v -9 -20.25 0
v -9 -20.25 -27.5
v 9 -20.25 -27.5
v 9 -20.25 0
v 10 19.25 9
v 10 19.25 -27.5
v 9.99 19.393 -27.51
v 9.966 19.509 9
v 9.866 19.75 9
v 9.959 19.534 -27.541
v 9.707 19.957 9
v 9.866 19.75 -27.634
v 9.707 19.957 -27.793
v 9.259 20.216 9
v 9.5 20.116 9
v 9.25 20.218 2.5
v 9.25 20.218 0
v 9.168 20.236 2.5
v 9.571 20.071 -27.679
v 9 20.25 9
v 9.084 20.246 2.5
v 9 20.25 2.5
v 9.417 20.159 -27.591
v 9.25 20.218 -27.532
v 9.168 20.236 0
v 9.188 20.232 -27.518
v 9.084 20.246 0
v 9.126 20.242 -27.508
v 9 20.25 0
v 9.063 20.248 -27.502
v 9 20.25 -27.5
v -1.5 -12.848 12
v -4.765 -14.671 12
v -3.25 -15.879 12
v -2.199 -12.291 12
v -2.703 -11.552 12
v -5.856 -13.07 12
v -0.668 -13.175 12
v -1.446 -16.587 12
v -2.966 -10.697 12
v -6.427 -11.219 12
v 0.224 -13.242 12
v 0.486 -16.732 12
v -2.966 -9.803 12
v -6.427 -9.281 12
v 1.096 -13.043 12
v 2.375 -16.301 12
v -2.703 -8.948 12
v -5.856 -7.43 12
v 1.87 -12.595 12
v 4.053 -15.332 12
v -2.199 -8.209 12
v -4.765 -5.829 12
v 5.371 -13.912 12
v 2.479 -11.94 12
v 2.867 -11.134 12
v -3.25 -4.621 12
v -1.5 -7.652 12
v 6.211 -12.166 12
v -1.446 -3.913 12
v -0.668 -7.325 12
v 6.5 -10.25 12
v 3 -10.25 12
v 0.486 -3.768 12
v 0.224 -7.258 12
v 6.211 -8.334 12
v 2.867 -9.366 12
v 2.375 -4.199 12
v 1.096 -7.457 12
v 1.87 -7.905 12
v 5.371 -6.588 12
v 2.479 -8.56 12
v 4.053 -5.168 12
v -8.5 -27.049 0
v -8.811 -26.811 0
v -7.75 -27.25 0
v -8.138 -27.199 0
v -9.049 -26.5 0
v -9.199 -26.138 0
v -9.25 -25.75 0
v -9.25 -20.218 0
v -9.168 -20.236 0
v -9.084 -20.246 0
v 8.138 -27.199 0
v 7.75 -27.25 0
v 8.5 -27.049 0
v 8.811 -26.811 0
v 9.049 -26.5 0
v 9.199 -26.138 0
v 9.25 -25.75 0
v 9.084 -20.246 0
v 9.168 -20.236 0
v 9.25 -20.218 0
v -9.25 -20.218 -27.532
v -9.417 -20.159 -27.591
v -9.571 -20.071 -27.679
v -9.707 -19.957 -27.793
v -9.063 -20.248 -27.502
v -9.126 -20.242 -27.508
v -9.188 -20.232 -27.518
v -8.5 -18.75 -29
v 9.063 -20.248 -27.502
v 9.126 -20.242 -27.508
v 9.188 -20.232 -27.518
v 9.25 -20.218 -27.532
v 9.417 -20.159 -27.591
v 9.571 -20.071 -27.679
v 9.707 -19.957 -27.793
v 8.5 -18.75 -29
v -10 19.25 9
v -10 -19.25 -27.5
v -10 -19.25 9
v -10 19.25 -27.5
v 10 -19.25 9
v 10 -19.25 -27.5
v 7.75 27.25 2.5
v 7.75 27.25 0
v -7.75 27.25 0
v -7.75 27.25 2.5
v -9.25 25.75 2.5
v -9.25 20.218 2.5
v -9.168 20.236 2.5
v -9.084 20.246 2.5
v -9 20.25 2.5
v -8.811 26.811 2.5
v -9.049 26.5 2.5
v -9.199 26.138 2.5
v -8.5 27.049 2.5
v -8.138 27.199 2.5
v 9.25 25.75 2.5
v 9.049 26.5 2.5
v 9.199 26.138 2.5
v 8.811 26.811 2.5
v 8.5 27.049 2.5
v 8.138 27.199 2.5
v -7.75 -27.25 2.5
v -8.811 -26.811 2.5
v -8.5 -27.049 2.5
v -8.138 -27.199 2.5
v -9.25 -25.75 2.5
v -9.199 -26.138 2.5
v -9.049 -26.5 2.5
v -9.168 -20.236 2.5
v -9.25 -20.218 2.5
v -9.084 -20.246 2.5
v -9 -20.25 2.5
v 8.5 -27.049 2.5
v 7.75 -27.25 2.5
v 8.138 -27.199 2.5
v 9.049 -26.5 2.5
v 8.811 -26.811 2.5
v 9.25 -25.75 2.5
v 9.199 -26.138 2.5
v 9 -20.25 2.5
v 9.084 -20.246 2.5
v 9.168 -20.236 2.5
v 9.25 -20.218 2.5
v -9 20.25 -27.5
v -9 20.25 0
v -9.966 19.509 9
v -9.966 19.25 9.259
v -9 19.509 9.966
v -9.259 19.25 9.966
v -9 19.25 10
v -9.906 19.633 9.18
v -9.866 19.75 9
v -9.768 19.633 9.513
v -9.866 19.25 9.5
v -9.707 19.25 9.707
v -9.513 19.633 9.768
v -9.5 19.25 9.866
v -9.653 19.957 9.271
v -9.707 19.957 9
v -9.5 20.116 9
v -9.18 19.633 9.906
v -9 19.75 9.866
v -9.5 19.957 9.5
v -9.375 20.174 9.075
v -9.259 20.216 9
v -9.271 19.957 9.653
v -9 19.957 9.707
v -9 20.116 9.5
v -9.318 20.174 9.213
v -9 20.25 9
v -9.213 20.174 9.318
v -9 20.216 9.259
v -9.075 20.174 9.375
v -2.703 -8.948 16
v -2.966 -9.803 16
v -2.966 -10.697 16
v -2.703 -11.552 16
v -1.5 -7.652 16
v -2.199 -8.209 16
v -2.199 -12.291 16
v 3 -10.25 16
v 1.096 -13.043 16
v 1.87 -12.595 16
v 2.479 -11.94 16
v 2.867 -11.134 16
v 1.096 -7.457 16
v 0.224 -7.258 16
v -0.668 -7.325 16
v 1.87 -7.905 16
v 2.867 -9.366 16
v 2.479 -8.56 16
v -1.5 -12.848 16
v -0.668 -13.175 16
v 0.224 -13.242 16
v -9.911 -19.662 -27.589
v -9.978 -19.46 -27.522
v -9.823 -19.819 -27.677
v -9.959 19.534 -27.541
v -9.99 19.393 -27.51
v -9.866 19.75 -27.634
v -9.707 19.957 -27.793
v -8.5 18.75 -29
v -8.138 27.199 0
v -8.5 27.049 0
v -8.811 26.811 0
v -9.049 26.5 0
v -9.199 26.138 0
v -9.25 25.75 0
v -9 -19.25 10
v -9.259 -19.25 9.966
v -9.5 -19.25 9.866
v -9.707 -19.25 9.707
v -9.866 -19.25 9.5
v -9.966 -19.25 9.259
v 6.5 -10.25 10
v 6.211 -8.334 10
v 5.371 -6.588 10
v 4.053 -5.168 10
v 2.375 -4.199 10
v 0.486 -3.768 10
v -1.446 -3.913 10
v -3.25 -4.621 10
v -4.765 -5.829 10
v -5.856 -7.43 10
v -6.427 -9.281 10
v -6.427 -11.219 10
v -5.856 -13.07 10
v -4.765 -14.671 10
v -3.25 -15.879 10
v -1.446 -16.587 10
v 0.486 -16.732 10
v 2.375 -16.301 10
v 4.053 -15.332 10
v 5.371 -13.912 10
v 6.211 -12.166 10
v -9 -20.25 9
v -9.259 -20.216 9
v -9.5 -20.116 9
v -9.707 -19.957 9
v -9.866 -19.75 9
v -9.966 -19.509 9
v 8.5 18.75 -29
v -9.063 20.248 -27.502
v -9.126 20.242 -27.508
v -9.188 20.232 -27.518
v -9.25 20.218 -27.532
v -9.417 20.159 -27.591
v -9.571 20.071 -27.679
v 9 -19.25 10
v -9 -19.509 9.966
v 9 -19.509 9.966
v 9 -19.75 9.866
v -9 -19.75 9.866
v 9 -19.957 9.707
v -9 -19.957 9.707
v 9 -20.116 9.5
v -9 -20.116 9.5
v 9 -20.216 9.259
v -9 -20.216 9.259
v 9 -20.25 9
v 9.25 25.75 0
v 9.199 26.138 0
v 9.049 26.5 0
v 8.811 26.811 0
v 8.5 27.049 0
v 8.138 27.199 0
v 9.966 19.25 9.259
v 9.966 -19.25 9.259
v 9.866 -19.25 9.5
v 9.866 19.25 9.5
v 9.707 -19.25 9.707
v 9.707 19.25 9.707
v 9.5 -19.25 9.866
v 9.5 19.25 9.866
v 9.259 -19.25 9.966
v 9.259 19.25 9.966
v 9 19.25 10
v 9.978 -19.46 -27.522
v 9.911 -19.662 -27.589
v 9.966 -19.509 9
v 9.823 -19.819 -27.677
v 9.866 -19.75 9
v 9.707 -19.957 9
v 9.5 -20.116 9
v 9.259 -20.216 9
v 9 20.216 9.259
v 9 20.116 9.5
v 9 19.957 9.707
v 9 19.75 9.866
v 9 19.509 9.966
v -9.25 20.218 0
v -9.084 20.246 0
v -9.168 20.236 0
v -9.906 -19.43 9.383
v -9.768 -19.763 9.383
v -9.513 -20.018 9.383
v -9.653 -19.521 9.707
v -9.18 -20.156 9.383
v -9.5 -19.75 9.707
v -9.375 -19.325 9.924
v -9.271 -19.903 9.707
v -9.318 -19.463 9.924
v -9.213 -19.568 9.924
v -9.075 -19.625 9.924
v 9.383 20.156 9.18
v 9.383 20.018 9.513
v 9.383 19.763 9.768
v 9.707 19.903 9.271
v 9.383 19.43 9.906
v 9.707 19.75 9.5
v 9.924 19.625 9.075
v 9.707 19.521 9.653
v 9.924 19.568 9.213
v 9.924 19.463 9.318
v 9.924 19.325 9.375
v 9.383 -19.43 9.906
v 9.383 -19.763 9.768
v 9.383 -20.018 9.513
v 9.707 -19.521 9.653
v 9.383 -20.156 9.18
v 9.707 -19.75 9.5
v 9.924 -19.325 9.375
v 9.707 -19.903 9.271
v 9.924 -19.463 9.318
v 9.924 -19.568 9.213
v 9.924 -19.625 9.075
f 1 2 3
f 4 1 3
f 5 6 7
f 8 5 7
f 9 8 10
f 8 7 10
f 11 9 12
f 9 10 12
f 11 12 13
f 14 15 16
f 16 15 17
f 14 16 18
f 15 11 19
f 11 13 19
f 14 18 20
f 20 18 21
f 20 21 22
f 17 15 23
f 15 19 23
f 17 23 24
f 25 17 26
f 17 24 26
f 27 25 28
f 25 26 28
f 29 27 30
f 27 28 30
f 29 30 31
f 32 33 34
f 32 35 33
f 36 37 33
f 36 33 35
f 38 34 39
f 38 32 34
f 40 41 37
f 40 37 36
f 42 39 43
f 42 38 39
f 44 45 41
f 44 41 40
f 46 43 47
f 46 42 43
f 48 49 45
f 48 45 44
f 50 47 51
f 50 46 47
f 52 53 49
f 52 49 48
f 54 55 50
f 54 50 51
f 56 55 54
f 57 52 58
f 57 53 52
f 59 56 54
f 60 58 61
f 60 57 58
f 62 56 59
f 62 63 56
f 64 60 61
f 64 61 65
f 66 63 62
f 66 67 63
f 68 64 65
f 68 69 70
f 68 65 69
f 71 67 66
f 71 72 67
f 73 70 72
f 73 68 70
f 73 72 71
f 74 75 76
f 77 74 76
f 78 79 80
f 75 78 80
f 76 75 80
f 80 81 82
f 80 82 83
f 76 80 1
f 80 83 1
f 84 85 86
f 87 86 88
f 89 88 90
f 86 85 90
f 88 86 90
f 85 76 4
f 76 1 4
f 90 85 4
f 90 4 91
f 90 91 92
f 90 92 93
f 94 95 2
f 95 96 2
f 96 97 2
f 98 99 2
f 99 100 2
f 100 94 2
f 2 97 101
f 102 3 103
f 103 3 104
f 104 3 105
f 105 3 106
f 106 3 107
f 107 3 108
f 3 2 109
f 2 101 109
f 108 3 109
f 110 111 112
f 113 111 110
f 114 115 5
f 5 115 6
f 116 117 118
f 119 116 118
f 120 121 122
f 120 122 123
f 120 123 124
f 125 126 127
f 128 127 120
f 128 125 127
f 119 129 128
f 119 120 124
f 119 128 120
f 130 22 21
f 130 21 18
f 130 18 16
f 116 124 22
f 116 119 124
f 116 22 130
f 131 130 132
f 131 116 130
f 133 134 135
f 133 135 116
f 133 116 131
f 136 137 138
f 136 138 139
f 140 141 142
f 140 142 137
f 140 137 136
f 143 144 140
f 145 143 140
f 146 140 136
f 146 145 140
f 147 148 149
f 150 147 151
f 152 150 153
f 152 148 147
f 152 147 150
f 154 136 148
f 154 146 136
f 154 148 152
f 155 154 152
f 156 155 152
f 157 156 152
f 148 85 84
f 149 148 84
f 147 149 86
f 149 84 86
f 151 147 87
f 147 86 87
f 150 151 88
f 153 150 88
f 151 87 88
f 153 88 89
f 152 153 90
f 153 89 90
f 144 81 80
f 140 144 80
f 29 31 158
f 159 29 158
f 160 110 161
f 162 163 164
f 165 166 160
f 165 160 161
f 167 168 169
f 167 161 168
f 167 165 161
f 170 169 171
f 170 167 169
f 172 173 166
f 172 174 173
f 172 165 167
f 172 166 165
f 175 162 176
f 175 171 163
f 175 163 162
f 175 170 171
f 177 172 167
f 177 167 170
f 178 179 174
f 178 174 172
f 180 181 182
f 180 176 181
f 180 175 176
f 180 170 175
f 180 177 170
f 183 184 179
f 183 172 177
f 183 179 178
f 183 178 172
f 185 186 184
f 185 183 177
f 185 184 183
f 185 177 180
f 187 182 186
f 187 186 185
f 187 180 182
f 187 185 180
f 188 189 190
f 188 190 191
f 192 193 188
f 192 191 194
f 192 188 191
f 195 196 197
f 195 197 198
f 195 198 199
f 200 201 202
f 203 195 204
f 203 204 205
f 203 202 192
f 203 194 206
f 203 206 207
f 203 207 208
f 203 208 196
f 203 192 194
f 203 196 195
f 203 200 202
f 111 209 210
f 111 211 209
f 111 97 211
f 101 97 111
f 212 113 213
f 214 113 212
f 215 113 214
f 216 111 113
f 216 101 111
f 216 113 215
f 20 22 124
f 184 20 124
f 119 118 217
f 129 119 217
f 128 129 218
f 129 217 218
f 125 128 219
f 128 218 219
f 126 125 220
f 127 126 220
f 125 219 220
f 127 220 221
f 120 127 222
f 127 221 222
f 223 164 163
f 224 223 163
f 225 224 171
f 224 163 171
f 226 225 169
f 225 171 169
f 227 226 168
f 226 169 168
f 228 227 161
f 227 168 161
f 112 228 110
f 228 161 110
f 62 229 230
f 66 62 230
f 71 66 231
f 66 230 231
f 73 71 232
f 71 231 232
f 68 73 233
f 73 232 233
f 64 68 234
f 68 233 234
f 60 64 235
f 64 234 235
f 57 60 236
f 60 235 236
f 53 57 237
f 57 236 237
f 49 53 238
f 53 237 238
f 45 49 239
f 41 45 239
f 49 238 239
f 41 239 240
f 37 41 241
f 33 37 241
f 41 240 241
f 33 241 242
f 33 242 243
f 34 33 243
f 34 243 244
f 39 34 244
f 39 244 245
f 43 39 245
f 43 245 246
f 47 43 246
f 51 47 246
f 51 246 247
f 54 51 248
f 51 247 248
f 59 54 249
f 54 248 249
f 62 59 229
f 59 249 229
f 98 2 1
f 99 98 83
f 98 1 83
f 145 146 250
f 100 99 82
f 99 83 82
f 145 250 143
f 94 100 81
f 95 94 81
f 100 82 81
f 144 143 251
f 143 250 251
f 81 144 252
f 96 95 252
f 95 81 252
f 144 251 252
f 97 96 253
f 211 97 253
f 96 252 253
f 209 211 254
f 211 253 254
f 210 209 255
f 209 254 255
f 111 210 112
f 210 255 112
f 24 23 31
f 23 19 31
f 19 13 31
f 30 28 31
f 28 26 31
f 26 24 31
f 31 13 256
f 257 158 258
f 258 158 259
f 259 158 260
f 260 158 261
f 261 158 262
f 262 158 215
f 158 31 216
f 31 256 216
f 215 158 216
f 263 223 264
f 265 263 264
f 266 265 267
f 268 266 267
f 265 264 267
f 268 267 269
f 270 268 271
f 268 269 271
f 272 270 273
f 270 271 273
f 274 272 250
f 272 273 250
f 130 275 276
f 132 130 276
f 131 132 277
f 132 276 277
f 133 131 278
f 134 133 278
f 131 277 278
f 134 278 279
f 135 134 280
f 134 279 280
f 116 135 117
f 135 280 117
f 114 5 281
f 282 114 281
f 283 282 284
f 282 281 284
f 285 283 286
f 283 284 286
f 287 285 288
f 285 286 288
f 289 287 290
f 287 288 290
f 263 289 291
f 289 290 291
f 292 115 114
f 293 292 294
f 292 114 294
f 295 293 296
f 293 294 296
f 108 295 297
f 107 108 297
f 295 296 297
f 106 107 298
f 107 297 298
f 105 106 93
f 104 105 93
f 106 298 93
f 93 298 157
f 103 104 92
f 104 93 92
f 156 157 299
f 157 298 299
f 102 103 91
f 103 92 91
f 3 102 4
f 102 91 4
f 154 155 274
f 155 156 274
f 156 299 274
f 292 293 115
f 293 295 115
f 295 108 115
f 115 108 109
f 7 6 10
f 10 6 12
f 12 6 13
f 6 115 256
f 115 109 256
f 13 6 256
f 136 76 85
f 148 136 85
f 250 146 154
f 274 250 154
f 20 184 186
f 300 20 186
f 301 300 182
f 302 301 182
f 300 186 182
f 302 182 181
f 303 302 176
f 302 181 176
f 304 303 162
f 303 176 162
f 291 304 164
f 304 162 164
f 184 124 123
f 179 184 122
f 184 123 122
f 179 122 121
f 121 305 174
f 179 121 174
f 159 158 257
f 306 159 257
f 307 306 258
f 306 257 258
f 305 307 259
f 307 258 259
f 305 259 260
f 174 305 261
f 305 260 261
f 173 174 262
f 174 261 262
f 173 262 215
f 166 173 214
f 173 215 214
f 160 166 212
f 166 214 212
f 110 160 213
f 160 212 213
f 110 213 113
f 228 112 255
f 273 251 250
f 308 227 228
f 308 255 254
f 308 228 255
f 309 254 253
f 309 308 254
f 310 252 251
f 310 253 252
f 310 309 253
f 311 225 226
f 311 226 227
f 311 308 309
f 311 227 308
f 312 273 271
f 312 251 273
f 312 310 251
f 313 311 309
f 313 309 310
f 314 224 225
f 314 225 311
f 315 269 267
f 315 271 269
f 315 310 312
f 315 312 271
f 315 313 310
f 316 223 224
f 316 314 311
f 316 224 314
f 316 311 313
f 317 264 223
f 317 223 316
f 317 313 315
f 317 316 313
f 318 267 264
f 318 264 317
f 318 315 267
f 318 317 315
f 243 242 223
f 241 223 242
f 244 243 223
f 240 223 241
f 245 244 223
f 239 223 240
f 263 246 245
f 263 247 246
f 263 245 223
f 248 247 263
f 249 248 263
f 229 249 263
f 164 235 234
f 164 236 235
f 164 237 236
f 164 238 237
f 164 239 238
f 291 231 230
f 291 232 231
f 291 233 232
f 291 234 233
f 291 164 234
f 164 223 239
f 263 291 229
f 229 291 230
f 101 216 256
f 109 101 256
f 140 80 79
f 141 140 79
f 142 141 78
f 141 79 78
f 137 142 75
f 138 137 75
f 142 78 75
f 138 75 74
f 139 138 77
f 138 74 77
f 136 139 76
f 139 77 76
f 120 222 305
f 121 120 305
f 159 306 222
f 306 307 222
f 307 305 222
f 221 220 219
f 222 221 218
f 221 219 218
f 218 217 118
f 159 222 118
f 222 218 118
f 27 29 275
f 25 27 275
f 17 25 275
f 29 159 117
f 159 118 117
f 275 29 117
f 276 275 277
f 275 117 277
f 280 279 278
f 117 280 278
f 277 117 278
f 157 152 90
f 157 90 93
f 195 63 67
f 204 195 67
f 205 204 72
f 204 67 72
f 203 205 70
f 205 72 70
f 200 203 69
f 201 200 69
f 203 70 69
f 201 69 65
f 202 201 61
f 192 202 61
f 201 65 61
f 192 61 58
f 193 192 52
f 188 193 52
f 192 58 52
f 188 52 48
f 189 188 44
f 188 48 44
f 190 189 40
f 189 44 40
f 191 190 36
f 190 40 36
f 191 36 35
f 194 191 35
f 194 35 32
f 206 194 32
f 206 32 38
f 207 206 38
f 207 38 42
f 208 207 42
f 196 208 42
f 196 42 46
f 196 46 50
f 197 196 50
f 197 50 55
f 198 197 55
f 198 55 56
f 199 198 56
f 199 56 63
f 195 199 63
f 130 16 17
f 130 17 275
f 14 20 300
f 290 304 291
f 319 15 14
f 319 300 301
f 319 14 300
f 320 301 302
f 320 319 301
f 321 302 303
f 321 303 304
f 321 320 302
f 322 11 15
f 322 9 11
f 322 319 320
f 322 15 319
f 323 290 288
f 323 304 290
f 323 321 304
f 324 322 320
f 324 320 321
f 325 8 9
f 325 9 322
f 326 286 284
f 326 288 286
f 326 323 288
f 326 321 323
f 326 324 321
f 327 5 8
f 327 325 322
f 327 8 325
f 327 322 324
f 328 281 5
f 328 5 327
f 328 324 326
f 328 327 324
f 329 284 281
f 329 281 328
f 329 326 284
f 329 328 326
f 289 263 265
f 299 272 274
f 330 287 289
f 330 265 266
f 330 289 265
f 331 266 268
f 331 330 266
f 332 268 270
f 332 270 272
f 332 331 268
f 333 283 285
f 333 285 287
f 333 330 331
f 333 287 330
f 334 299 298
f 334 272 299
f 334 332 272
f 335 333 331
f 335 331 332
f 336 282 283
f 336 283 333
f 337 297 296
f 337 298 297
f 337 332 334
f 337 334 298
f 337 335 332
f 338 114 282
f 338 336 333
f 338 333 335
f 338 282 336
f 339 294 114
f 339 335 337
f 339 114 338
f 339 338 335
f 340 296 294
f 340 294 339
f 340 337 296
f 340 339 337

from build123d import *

# Parameters (mm, degrees)
F0_W          = 0.75
F0_H          = 40.5
F0_W_2        = 18.5
F1_DEPTH      = 29
F1_DEPTH_BACK = 10
F2_DEPTH      = 2.5
F3_R          = 6.5
F3_R_2        = 3
F4_DEPTH      = 2
F5_DEPTH      = 6
F6_SIZE       = 1.5
F7_T1_DEPTH   = 38.5
F7_T3_DEPTH   = 18
F7_S7_W       = 1
F7_S7_H       = 1
F7_T8_DEPTH   = 1
F7_S13_W      = 1
F7_S13_H      = 1
F7_T14_DEPTH  = 1
F7_S19_W      = 1
F7_S19_H      = 1
F7_T20_DEPTH  = 1
F7_S25_W      = 1
F7_S25_H      = 1
F7_T26_DEPTH  = 1
F7_T32_DEPTH  = 39
F7_T38_DEPTH  = 39
F7_T44_DEPTH  = 39
F7_T51_DEPTH  = 39
F7_T57_DEPTH  = 39
F7_T63_DEPTH  = 39
F7_T69_DEPTH  = 39
F7_T75_DEPTH  = 39
F7_T82_DEPTH  = 39
F7_T88_DEPTH  = 39
F7_T94_DEPTH  = 39
F7_T100_DEPTH = 39
F7_T106_DEPTH = 39
F7_T113_DEPTH = 39
F7_T119_DEPTH = 39
F7_T125_DEPTH = 39
F7_T131_DEPTH = 39
F7_T137_DEPTH = 39
F7_T144_DEPTH = 39
F7_T150_DEPTH = 39


# Not quite as in the source:
# - a fillet or chamfer that OpenCascade refuses, or shapes differently, is made with other operations: its cross-section is extruded or revolved along the edge and cut away or added


with BuildPart() as f1:
    # F0 (on Top) → F1 (new body, two sides)
    with BuildSketch(Plane.XY) as f1_sk:
        with Locations((9.625, 0)):
            Rectangle(F0_W, F0_H)
        Rectangle(F0_W_2, F0_H)
        with Locations((-9.625, 0)):
            Rectangle(F0_W, F0_H)
    extrude(amount=-F1_DEPTH)
    extrude(f1_sk.sketch, amount=F1_DEPTH_BACK)

    # F0 (on Top) → F2 (join)
    with BuildSketch(Plane.XY):
        with BuildLine():
            Line((9.25, -25.75), (9.25, -20.25))
            Line((9.25, -20.25), (-9.25, -20.25))
            Line((-9.25, -20.25), (-9.25, -25.75))
            ThreePointArc((-9.25, -25.75), (-8.8106601718, -26.8106601718), (-7.75, -27.25))
            Line((-7.75, -27.25), (7.75, -27.25))
            ThreePointArc((7.75, -27.25), (8.8106601718, -26.8106601718), (9.25, -25.75))
        make_face()
        with BuildLine():
            Line((-9.25, 20.25), (9.25, 20.25))
            Line((9.25, 20.25), (9.25, 25.75))
            ThreePointArc((9.25, 25.75), (8.8106601718, 26.8106601718), (7.75, 27.25))
            Line((7.75, 27.25), (-7.75, 27.25))
            ThreePointArc((-7.75, 27.25), (-8.8106601718, 26.8106601718), (-9.25, 25.75))
            Line((-9.25, 25.75), (-9.25, 20.25))
        make_face()
    extrude(amount=F2_DEPTH)

    # F3 (on face) → F4 (join)
    with BuildSketch(Plane.XY.offset(10)):
        with Locations((0, -10.25)):
            Circle(F3_R)
        with Locations((0, -10.25)):
            Circle(F3_R_2, mode=Mode.SUBTRACT)
    extrude(amount=F4_DEPTH)

    # F3 (on face) → F5 (join)
    with BuildSketch(Plane.XY.offset(10)):
        with Locations((0, -10.25)):
            Circle(F3_R_2)
    extrude(amount=F5_DEPTH)

    # F6
    f6_edges = [f1.edges().sort_by_distance(p)[0] for p in [
        (10, 0, -29),
        (0, 20.25, -29),
        (-10, 0, -29),
        (0, -20.25, -29),
    ]]
    chamfer(f6_edges, length=F6_SIZE)

    # F7: fillet of radius 1 on 8 edges, made by hand

    # F7_s2 → F7_t1 (cut)
    with BuildSketch(Plane.XZ.offset(-19.25)):
        with BuildLine():
            ThreePointArc((-9, 10), (-9.7071067812, 9.7071067812), (-10, 9))
            Line((-10, 9), (-10, 10))
            Line((-10, 10), (-9, 10))
        make_face()
        with BuildLine():
            ThreePointArc((10, 9), (9.7071067812, 9.7071067812), (9, 10))
            Line((9, 10), (10, 10))
            Line((10, 10), (10, 9))
        make_face()
    extrude(amount=F7_T1_DEPTH, mode=Mode.SUBTRACT)

    # F7_s4 → F7_t3 (cut)
    with BuildSketch(Plane.YZ.offset(-9)):
        with BuildLine():
            ThreePointArc((20.25, 9), (19.9571067812, 9.7071067812), (19.25, 10))
            Line((19.25, 10), (20.25, 10))
            Line((20.25, 10), (20.25, 9))
        make_face()
        with BuildLine():
            ThreePointArc((-19.25, 10), (-19.9571067812, 9.7071067812), (-20.25, 9))
            Line((-20.25, 9), (-20.25, 10))
            Line((-20.25, 10), (-19.25, 10))
        make_face()
    extrude(amount=F7_T3_DEPTH, mode=Mode.SUBTRACT)


with BuildPart() as f7_tool6:
    # F7_s7 → F7_t8 (new body)
    with BuildSketch(Plane.XZ.offset(-19.25)):
        with Locations((-9.5, 9.5)):
            Rectangle(F7_S7_W, F7_S7_H)
    extrude(amount=-F7_T8_DEPTH)

    # F7_s9 → F7_t10 (revolve, cut)
    with BuildSketch(Plane(origin=(-9, 19.25, 9), x_dir=(0.7071067812, 0, -0.7071067812), z_dir=(0.7071067812, 0, 0.7071067812))):
        with BuildLine():
            ThreePointArc((0, -1), (1, 0), (0, 1))
            Line((0, 1), (0, -1))
        make_face()
    revolve(axis=Axis((-9, 19.25, 9), (0, 1, 0)), mode=Mode.SUBTRACT)


with BuildPart() as f1_1:
    add(f1.part)

    # F7_t5: cut F7_tool6
    add(f7_tool6.part, mode=Mode.SUBTRACT)


with BuildPart() as f7_tool12:
    # F7_s13 → F7_t14 (new body)
    with BuildSketch(Plane.XY.offset(9)):
        with Locations((-9.5, -19.75)):
            Rectangle(F7_S13_W, F7_S13_H)
    extrude(amount=F7_T14_DEPTH)

    # F7_s15 → F7_t16 (revolve, cut)
    with BuildSketch(Plane(origin=(-9, -19.25, 9), x_dir=(0.7071067812, 0.7071067812, 0), z_dir=(0.7071067812, -0.7071067812, 0))):
        with BuildLine():
            ThreePointArc((0, -1), (1, 0), (0, 1))
            Line((0, 1), (0, -1))
        make_face()
    revolve(axis=Axis((-9, -19.25, 9), (0, 0, 1)), mode=Mode.SUBTRACT)


with BuildPart() as f1_2:
    add(f1_1.part)

    # F7_t11: cut F7_tool12
    add(f7_tool12.part, mode=Mode.SUBTRACT)


with BuildPart() as f7_tool18:
    # F7_s19 → F7_t20 (new body)
    with BuildSketch(Plane.YZ.offset(9)):
        with Locations((19.75, 9.5)):
            Rectangle(F7_S19_W, F7_S19_H)
    extrude(amount=F7_T20_DEPTH)

    # F7_s21 → F7_t22 (revolve, cut)
    with BuildSketch(Plane(origin=(9, 19.25, 9), x_dir=(0, -0.7071067812, -0.7071067812), z_dir=(0, -0.7071067812, 0.7071067812))):
        with BuildLine():
            ThreePointArc((0, -1), (1, 0), (0, 1))
            Line((0, 1), (0, -1))
        make_face()
    revolve(axis=Axis((9, 19.25, 9), (1, 0, 0)), mode=Mode.SUBTRACT)


with BuildPart() as f1_3:
    add(f1_2.part)

    # F7_t17: cut F7_tool18
    add(f7_tool18.part, mode=Mode.SUBTRACT)


with BuildPart() as f7_tool24:
    # F7_s25 → F7_t26 (new body)
    with BuildSketch(Plane.YZ.offset(9)):
        with Locations((-19.75, 9.5)):
            Rectangle(F7_S25_W, F7_S25_H)
    extrude(amount=F7_T26_DEPTH)

    # F7_s27 → F7_t28 (revolve, cut)
    with BuildSketch(Plane(origin=(9, -19.25, 9), x_dir=(0, 0.7071067812, -0.7071067812), z_dir=(0, -0.7071067812, -0.7071067812))):
        with BuildLine():
            ThreePointArc((0, -1), (1, 0), (0, 1))
            Line((0, 1), (0, -1))
        make_face()
    revolve(axis=Axis((9, -19.25, 9), (1, 0, 0)), mode=Mode.SUBTRACT)


with BuildPart() as f1_4:
    add(f1_3.part)

    # F7_t23: cut F7_tool24
    add(f7_tool24.part, mode=Mode.SUBTRACT)


with BuildPart() as f7_tool30:
    # F7_s31 → F7_t32 (new body)
    with BuildSketch(Plane.XY.offset(-30)):
        with BuildLine():
            ThreePointArc((10, 19.25), (9.7071067812, 19.9571067812), (9, 20.25))
            Line((9, 20.25), (10, 20.25))
            Line((10, 20.25), (10, 19.25))
        make_face()
    extrude(amount=F7_T32_DEPTH)

    split(bisect_by=Plane.YZ.offset(9.25), keep=Keep.TOP)

    split(bisect_by=Plane.XY, keep=Keep.BOTTOM)


with BuildPart() as f1_5:
    add(f1_4.part)

    # F7_t29: cut F7_tool30
    add(f7_tool30.part, mode=Mode.SUBTRACT)


with BuildPart() as f7_tool36:
    # F7_s37 → F7_t38 (new body)
    with BuildSketch(Plane.XY.offset(-30)):
        with BuildLine():
            ThreePointArc((10, 19.25), (9.7071067812, 19.9571067812), (9, 20.25))
            Line((9, 20.25), (10, 20.25))
            Line((10, 20.25), (10, 19.25))
        make_face()
    extrude(amount=F7_T38_DEPTH)

    split(bisect_by=Plane.YZ.offset(9.25), keep=Keep.BOTTOM)

    split(bisect_by=Plane.XY, keep=Keep.BOTTOM)


with BuildPart() as f1_6:
    add(f1_5.part)

    # F7_t35: cut F7_tool36
    add(f7_tool36.part, mode=Mode.SUBTRACT)


with BuildPart() as f7_tool42:
    # F7_s43 → F7_t44 (new body)
    with BuildSketch(Plane.XY.offset(-30)):
        with BuildLine():
            ThreePointArc((10, 19.25), (9.7071067812, 19.9571067812), (9, 20.25))
            Line((9, 20.25), (10, 20.25))
            Line((10, 20.25), (10, 19.25))
        make_face()
    extrude(amount=F7_T44_DEPTH)

    split(bisect_by=Plane.XY.offset(2.5), keep=Keep.BOTTOM)

    split(bisect_by=Plane.YZ.offset(9.25), keep=Keep.TOP)

    split(bisect_by=Plane.XY, keep=Keep.TOP)


with BuildPart() as f1_7:
    add(f1_6.part)

    # F7_t41: cut F7_tool42
    add(f7_tool42.part, mode=Mode.SUBTRACT)


with BuildPart() as f7_tool49:
    # F7_s50 → F7_t51 (new body)
    with BuildSketch(Plane.XY.offset(-30)):
        with BuildLine():
            ThreePointArc((10, 19.25), (9.7071067812, 19.9571067812), (9, 20.25))
            Line((9, 20.25), (10, 20.25))
            Line((10, 20.25), (10, 19.25))
        make_face()
    extrude(amount=F7_T51_DEPTH)

    split(bisect_by=Plane.XY.offset(2.5), keep=Keep.TOP)

    split(bisect_by=Plane.YZ.offset(9.25), keep=Keep.TOP)


with BuildPart() as f1_8:
    add(f1_7.part)

    # F7_t48: cut F7_tool49
    add(f7_tool49.part, mode=Mode.SUBTRACT)


with BuildPart() as f7_tool55:
    # F7_s56 → F7_t57 (new body)
    with BuildSketch(Plane.XY.offset(-30)):
        with BuildLine():
            ThreePointArc((10, 19.25), (9.7071067812, 19.9571067812), (9, 20.25))
            Line((9, 20.25), (10, 20.25))
            Line((10, 20.25), (10, 19.25))
        make_face()
    extrude(amount=F7_T57_DEPTH)

    split(bisect_by=Plane.XY.offset(2.5), keep=Keep.TOP)

    split(bisect_by=Plane.YZ.offset(9.25), keep=Keep.BOTTOM)


with BuildPart() as f1_9:
    add(f1_8.part)

    # F7_t54: cut F7_tool55
    add(f7_tool55.part, mode=Mode.SUBTRACT)


with BuildPart() as f7_tool61:
    # F7_s62 → F7_t63 (new body)
    with BuildSketch(Plane.XY.offset(9)):
        with BuildLine():
            ThreePointArc((-9, -20.25), (-9.7071067812, -19.9571067812), (-10, -19.25))
            Line((-10, -19.25), (-10, -20.25))
            Line((-10, -20.25), (-9, -20.25))
        make_face()
    extrude(amount=-F7_T63_DEPTH)

    split(bisect_by=Plane.XY.offset(2.5), keep=Keep.TOP)

    split(bisect_by=Plane.YZ.offset(-9.25), keep=Keep.TOP)


with BuildPart() as f1_10:
    add(f1_9.part)

    # F7_t60: cut F7_tool61
    add(f7_tool61.part, mode=Mode.SUBTRACT)


with BuildPart() as f7_tool67:
    # F7_s68 → F7_t69 (new body)
    with BuildSketch(Plane.XY.offset(9)):
        with BuildLine():
            ThreePointArc((-9, -20.25), (-9.7071067812, -19.9571067812), (-10, -19.25))
            Line((-10, -19.25), (-10, -20.25))
            Line((-10, -20.25), (-9, -20.25))
        make_face()
    extrude(amount=-F7_T69_DEPTH)

    split(bisect_by=Plane.XY.offset(2.5), keep=Keep.TOP)

    split(bisect_by=Plane.YZ.offset(-9.25), keep=Keep.BOTTOM)


with BuildPart() as f1_11:
    add(f1_10.part)

    # F7_t66: cut F7_tool67
    add(f7_tool67.part, mode=Mode.SUBTRACT)


with BuildPart() as f7_tool73:
    # F7_s74 → F7_t75 (new body)
    with BuildSketch(Plane.XY.offset(9)):
        with BuildLine():
            ThreePointArc((-9, -20.25), (-9.7071067812, -19.9571067812), (-10, -19.25))
            Line((-10, -19.25), (-10, -20.25))
            Line((-10, -20.25), (-9, -20.25))
        make_face()
    extrude(amount=-F7_T75_DEPTH)

    split(bisect_by=Plane.XY.offset(2.5), keep=Keep.BOTTOM)

    split(bisect_by=Plane.YZ.offset(-9.25), keep=Keep.BOTTOM)

    split(bisect_by=Plane.XY, keep=Keep.TOP)


with BuildPart() as f1_12:
    add(f1_11.part)

    # F7_t72: cut F7_tool73
    add(f7_tool73.part, mode=Mode.SUBTRACT)


with BuildPart() as f7_tool80:
    # F7_s81 → F7_t82 (new body)
    with BuildSketch(Plane.XY.offset(9)):
        with BuildLine():
            ThreePointArc((-9, -20.25), (-9.7071067812, -19.9571067812), (-10, -19.25))
            Line((-10, -19.25), (-10, -20.25))
            Line((-10, -20.25), (-9, -20.25))
        make_face()
    extrude(amount=-F7_T82_DEPTH)

    split(bisect_by=Plane.YZ.offset(-9.25), keep=Keep.TOP)

    split(bisect_by=Plane.XY, keep=Keep.BOTTOM)


with BuildPart() as f1_13:
    add(f1_12.part)

    # F7_t79: cut F7_tool80
    add(f7_tool80.part, mode=Mode.SUBTRACT)


with BuildPart() as f7_tool86:
    # F7_s87 → F7_t88 (new body)
    with BuildSketch(Plane.XY.offset(9)):
        with BuildLine():
            ThreePointArc((-9, -20.25), (-9.7071067812, -19.9571067812), (-10, -19.25))
            Line((-10, -19.25), (-10, -20.25))
            Line((-10, -20.25), (-9, -20.25))
        make_face()
    extrude(amount=-F7_T88_DEPTH)

    split(bisect_by=Plane.YZ.offset(-9.25), keep=Keep.BOTTOM)

    split(bisect_by=Plane.XY, keep=Keep.BOTTOM)


with BuildPart() as f1_14:
    add(f1_13.part)

    # F7_t85: cut F7_tool86
    add(f7_tool86.part, mode=Mode.SUBTRACT)


with BuildPart() as f7_tool92:
    # F7_s93 → F7_t94 (new body)
    with BuildSketch(Plane.XY.offset(9)):
        with BuildLine():
            ThreePointArc((10, -19.25), (9.7071067812, -19.9571067812), (9, -20.25))
            Line((9, -20.25), (10, -20.25))
            Line((10, -20.25), (10, -19.25))
        make_face()
    extrude(amount=-F7_T94_DEPTH)

    split(bisect_by=Plane.YZ.offset(9.25), keep=Keep.TOP)

    split(bisect_by=Plane.XY.offset(2.5), keep=Keep.TOP)


with BuildPart() as f1_15:
    add(f1_14.part)

    # F7_t91: cut F7_tool92
    add(f7_tool92.part, mode=Mode.SUBTRACT)


with BuildPart() as f7_tool98:
    # F7_s99 → F7_t100 (new body)
    with BuildSketch(Plane.XY.offset(9)):
        with BuildLine():
            ThreePointArc((10, -19.25), (9.7071067812, -19.9571067812), (9, -20.25))
            Line((9, -20.25), (10, -20.25))
            Line((10, -20.25), (10, -19.25))
        make_face()
    extrude(amount=-F7_T100_DEPTH)

    split(bisect_by=Plane.YZ.offset(9.25), keep=Keep.BOTTOM)

    split(bisect_by=Plane.XY.offset(2.5), keep=Keep.TOP)


with BuildPart() as f1_16:
    add(f1_15.part)

    # F7_t97: cut F7_tool98
    add(f7_tool98.part, mode=Mode.SUBTRACT)


with BuildPart() as f7_tool104:
    # F7_s105 → F7_t106 (new body)
    with BuildSketch(Plane.XY.offset(9)):
        with BuildLine():
            ThreePointArc((10, -19.25), (9.7071067812, -19.9571067812), (9, -20.25))
            Line((9, -20.25), (10, -20.25))
            Line((10, -20.25), (10, -19.25))
        make_face()
    extrude(amount=-F7_T106_DEPTH)

    split(bisect_by=Plane.YZ.offset(9.25), keep=Keep.TOP)

    split(bisect_by=Plane.XY.offset(2.5), keep=Keep.BOTTOM)

    split(bisect_by=Plane.XY, keep=Keep.TOP)


with BuildPart() as f1_17:
    add(f1_16.part)

    # F7_t103: cut F7_tool104
    add(f7_tool104.part, mode=Mode.SUBTRACT)


with BuildPart() as f7_tool111:
    # F7_s112 → F7_t113 (new body)
    with BuildSketch(Plane.XY.offset(9)):
        with BuildLine():
            ThreePointArc((10, -19.25), (9.7071067812, -19.9571067812), (9, -20.25))
            Line((9, -20.25), (10, -20.25))
            Line((10, -20.25), (10, -19.25))
        make_face()
    extrude(amount=-F7_T113_DEPTH)

    split(bisect_by=Plane.YZ.offset(9.25), keep=Keep.TOP)

    split(bisect_by=Plane.XY, keep=Keep.BOTTOM)


with BuildPart() as f1_18:
    add(f1_17.part)

    # F7_t110: cut F7_tool111
    add(f7_tool111.part, mode=Mode.SUBTRACT)


with BuildPart() as f7_tool117:
    # F7_s118 → F7_t119 (new body)
    with BuildSketch(Plane.XY.offset(9)):
        with BuildLine():
            ThreePointArc((10, -19.25), (9.7071067812, -19.9571067812), (9, -20.25))
            Line((9, -20.25), (10, -20.25))
            Line((10, -20.25), (10, -19.25))
        make_face()
    extrude(amount=-F7_T119_DEPTH)

    split(bisect_by=Plane.YZ.offset(9.25), keep=Keep.BOTTOM)

    split(bisect_by=Plane.XY, keep=Keep.BOTTOM)


with BuildPart() as f1_19:
    add(f1_18.part)

    # F7_t116: cut F7_tool117
    add(f7_tool117.part, mode=Mode.SUBTRACT)


with BuildPart() as f7_tool123:
    # F7_s124 → F7_t125 (new body)
    with BuildSketch(Plane.XY.offset(-30)):
        with BuildLine():
            ThreePointArc((-9, 20.25), (-9.7071067812, 19.9571067812), (-10, 19.25))
            Line((-10, 19.25), (-10, 20.25))
            Line((-10, 20.25), (-9, 20.25))
        make_face()
    extrude(amount=F7_T125_DEPTH)

    split(bisect_by=Plane.YZ.offset(-9.25), keep=Keep.TOP)

    split(bisect_by=Plane.XY, keep=Keep.BOTTOM)


with BuildPart() as f1_20:
    add(f1_19.part)

    # F7_t122: cut F7_tool123
    add(f7_tool123.part, mode=Mode.SUBTRACT)


with BuildPart() as f7_tool129:
    # F7_s130 → F7_t131 (new body)
    with BuildSketch(Plane.XY.offset(-30)):
        with BuildLine():
            ThreePointArc((-9, 20.25), (-9.7071067812, 19.9571067812), (-10, 19.25))
            Line((-10, 19.25), (-10, 20.25))
            Line((-10, 20.25), (-9, 20.25))
        make_face()
    extrude(amount=F7_T131_DEPTH)

    split(bisect_by=Plane.YZ.offset(-9.25), keep=Keep.BOTTOM)

    split(bisect_by=Plane.XY, keep=Keep.BOTTOM)


with BuildPart() as f1_21:
    add(f1_20.part)

    # F7_t128: cut F7_tool129
    add(f7_tool129.part, mode=Mode.SUBTRACT)


with BuildPart() as f7_tool135:
    # F7_s136 → F7_t137 (new body)
    with BuildSketch(Plane.XY.offset(-30)):
        with BuildLine():
            ThreePointArc((-9, 20.25), (-9.7071067812, 19.9571067812), (-10, 19.25))
            Line((-10, 19.25), (-10, 20.25))
            Line((-10, 20.25), (-9, 20.25))
        make_face()
    extrude(amount=F7_T137_DEPTH)

    split(bisect_by=Plane.YZ.offset(-9.25), keep=Keep.BOTTOM)

    split(bisect_by=Plane.XY.offset(2.5), keep=Keep.BOTTOM)

    split(bisect_by=Plane.XY, keep=Keep.TOP)


with BuildPart() as f1_22:
    add(f1_21.part)

    # F7_t134: cut F7_tool135
    add(f7_tool135.part, mode=Mode.SUBTRACT)


with BuildPart() as f7_tool142:
    # F7_s143 → F7_t144 (new body)
    with BuildSketch(Plane.XY.offset(-30)):
        with BuildLine():
            ThreePointArc((-9, 20.25), (-9.7071067812, 19.9571067812), (-10, 19.25))
            Line((-10, 19.25), (-10, 20.25))
            Line((-10, 20.25), (-9, 20.25))
        make_face()
    extrude(amount=F7_T144_DEPTH)

    split(bisect_by=Plane.YZ.offset(-9.25), keep=Keep.TOP)

    split(bisect_by=Plane.XY.offset(2.5), keep=Keep.TOP)


with BuildPart() as f1_23:
    add(f1_22.part)

    # F7_t141: cut F7_tool142
    add(f7_tool142.part, mode=Mode.SUBTRACT)


with BuildPart() as f7_tool148:
    # F7_s149 → F7_t150 (new body)
    with BuildSketch(Plane.XY.offset(-30)):
        with BuildLine():
            ThreePointArc((-9, 20.25), (-9.7071067812, 19.9571067812), (-10, 19.25))
            Line((-10, 19.25), (-10, 20.25))
            Line((-10, 20.25), (-9, 20.25))
        make_face()
    extrude(amount=F7_T150_DEPTH)

    split(bisect_by=Plane.YZ.offset(-9.25), keep=Keep.BOTTOM)

    split(bisect_by=Plane.XY.offset(2.5), keep=Keep.TOP)


with BuildPart() as f1_24:
    add(f1_23.part)

    # F7_t147: cut F7_tool148
    add(f7_tool148.part, mode=Mode.SUBTRACT)


solid = f1_24.part
